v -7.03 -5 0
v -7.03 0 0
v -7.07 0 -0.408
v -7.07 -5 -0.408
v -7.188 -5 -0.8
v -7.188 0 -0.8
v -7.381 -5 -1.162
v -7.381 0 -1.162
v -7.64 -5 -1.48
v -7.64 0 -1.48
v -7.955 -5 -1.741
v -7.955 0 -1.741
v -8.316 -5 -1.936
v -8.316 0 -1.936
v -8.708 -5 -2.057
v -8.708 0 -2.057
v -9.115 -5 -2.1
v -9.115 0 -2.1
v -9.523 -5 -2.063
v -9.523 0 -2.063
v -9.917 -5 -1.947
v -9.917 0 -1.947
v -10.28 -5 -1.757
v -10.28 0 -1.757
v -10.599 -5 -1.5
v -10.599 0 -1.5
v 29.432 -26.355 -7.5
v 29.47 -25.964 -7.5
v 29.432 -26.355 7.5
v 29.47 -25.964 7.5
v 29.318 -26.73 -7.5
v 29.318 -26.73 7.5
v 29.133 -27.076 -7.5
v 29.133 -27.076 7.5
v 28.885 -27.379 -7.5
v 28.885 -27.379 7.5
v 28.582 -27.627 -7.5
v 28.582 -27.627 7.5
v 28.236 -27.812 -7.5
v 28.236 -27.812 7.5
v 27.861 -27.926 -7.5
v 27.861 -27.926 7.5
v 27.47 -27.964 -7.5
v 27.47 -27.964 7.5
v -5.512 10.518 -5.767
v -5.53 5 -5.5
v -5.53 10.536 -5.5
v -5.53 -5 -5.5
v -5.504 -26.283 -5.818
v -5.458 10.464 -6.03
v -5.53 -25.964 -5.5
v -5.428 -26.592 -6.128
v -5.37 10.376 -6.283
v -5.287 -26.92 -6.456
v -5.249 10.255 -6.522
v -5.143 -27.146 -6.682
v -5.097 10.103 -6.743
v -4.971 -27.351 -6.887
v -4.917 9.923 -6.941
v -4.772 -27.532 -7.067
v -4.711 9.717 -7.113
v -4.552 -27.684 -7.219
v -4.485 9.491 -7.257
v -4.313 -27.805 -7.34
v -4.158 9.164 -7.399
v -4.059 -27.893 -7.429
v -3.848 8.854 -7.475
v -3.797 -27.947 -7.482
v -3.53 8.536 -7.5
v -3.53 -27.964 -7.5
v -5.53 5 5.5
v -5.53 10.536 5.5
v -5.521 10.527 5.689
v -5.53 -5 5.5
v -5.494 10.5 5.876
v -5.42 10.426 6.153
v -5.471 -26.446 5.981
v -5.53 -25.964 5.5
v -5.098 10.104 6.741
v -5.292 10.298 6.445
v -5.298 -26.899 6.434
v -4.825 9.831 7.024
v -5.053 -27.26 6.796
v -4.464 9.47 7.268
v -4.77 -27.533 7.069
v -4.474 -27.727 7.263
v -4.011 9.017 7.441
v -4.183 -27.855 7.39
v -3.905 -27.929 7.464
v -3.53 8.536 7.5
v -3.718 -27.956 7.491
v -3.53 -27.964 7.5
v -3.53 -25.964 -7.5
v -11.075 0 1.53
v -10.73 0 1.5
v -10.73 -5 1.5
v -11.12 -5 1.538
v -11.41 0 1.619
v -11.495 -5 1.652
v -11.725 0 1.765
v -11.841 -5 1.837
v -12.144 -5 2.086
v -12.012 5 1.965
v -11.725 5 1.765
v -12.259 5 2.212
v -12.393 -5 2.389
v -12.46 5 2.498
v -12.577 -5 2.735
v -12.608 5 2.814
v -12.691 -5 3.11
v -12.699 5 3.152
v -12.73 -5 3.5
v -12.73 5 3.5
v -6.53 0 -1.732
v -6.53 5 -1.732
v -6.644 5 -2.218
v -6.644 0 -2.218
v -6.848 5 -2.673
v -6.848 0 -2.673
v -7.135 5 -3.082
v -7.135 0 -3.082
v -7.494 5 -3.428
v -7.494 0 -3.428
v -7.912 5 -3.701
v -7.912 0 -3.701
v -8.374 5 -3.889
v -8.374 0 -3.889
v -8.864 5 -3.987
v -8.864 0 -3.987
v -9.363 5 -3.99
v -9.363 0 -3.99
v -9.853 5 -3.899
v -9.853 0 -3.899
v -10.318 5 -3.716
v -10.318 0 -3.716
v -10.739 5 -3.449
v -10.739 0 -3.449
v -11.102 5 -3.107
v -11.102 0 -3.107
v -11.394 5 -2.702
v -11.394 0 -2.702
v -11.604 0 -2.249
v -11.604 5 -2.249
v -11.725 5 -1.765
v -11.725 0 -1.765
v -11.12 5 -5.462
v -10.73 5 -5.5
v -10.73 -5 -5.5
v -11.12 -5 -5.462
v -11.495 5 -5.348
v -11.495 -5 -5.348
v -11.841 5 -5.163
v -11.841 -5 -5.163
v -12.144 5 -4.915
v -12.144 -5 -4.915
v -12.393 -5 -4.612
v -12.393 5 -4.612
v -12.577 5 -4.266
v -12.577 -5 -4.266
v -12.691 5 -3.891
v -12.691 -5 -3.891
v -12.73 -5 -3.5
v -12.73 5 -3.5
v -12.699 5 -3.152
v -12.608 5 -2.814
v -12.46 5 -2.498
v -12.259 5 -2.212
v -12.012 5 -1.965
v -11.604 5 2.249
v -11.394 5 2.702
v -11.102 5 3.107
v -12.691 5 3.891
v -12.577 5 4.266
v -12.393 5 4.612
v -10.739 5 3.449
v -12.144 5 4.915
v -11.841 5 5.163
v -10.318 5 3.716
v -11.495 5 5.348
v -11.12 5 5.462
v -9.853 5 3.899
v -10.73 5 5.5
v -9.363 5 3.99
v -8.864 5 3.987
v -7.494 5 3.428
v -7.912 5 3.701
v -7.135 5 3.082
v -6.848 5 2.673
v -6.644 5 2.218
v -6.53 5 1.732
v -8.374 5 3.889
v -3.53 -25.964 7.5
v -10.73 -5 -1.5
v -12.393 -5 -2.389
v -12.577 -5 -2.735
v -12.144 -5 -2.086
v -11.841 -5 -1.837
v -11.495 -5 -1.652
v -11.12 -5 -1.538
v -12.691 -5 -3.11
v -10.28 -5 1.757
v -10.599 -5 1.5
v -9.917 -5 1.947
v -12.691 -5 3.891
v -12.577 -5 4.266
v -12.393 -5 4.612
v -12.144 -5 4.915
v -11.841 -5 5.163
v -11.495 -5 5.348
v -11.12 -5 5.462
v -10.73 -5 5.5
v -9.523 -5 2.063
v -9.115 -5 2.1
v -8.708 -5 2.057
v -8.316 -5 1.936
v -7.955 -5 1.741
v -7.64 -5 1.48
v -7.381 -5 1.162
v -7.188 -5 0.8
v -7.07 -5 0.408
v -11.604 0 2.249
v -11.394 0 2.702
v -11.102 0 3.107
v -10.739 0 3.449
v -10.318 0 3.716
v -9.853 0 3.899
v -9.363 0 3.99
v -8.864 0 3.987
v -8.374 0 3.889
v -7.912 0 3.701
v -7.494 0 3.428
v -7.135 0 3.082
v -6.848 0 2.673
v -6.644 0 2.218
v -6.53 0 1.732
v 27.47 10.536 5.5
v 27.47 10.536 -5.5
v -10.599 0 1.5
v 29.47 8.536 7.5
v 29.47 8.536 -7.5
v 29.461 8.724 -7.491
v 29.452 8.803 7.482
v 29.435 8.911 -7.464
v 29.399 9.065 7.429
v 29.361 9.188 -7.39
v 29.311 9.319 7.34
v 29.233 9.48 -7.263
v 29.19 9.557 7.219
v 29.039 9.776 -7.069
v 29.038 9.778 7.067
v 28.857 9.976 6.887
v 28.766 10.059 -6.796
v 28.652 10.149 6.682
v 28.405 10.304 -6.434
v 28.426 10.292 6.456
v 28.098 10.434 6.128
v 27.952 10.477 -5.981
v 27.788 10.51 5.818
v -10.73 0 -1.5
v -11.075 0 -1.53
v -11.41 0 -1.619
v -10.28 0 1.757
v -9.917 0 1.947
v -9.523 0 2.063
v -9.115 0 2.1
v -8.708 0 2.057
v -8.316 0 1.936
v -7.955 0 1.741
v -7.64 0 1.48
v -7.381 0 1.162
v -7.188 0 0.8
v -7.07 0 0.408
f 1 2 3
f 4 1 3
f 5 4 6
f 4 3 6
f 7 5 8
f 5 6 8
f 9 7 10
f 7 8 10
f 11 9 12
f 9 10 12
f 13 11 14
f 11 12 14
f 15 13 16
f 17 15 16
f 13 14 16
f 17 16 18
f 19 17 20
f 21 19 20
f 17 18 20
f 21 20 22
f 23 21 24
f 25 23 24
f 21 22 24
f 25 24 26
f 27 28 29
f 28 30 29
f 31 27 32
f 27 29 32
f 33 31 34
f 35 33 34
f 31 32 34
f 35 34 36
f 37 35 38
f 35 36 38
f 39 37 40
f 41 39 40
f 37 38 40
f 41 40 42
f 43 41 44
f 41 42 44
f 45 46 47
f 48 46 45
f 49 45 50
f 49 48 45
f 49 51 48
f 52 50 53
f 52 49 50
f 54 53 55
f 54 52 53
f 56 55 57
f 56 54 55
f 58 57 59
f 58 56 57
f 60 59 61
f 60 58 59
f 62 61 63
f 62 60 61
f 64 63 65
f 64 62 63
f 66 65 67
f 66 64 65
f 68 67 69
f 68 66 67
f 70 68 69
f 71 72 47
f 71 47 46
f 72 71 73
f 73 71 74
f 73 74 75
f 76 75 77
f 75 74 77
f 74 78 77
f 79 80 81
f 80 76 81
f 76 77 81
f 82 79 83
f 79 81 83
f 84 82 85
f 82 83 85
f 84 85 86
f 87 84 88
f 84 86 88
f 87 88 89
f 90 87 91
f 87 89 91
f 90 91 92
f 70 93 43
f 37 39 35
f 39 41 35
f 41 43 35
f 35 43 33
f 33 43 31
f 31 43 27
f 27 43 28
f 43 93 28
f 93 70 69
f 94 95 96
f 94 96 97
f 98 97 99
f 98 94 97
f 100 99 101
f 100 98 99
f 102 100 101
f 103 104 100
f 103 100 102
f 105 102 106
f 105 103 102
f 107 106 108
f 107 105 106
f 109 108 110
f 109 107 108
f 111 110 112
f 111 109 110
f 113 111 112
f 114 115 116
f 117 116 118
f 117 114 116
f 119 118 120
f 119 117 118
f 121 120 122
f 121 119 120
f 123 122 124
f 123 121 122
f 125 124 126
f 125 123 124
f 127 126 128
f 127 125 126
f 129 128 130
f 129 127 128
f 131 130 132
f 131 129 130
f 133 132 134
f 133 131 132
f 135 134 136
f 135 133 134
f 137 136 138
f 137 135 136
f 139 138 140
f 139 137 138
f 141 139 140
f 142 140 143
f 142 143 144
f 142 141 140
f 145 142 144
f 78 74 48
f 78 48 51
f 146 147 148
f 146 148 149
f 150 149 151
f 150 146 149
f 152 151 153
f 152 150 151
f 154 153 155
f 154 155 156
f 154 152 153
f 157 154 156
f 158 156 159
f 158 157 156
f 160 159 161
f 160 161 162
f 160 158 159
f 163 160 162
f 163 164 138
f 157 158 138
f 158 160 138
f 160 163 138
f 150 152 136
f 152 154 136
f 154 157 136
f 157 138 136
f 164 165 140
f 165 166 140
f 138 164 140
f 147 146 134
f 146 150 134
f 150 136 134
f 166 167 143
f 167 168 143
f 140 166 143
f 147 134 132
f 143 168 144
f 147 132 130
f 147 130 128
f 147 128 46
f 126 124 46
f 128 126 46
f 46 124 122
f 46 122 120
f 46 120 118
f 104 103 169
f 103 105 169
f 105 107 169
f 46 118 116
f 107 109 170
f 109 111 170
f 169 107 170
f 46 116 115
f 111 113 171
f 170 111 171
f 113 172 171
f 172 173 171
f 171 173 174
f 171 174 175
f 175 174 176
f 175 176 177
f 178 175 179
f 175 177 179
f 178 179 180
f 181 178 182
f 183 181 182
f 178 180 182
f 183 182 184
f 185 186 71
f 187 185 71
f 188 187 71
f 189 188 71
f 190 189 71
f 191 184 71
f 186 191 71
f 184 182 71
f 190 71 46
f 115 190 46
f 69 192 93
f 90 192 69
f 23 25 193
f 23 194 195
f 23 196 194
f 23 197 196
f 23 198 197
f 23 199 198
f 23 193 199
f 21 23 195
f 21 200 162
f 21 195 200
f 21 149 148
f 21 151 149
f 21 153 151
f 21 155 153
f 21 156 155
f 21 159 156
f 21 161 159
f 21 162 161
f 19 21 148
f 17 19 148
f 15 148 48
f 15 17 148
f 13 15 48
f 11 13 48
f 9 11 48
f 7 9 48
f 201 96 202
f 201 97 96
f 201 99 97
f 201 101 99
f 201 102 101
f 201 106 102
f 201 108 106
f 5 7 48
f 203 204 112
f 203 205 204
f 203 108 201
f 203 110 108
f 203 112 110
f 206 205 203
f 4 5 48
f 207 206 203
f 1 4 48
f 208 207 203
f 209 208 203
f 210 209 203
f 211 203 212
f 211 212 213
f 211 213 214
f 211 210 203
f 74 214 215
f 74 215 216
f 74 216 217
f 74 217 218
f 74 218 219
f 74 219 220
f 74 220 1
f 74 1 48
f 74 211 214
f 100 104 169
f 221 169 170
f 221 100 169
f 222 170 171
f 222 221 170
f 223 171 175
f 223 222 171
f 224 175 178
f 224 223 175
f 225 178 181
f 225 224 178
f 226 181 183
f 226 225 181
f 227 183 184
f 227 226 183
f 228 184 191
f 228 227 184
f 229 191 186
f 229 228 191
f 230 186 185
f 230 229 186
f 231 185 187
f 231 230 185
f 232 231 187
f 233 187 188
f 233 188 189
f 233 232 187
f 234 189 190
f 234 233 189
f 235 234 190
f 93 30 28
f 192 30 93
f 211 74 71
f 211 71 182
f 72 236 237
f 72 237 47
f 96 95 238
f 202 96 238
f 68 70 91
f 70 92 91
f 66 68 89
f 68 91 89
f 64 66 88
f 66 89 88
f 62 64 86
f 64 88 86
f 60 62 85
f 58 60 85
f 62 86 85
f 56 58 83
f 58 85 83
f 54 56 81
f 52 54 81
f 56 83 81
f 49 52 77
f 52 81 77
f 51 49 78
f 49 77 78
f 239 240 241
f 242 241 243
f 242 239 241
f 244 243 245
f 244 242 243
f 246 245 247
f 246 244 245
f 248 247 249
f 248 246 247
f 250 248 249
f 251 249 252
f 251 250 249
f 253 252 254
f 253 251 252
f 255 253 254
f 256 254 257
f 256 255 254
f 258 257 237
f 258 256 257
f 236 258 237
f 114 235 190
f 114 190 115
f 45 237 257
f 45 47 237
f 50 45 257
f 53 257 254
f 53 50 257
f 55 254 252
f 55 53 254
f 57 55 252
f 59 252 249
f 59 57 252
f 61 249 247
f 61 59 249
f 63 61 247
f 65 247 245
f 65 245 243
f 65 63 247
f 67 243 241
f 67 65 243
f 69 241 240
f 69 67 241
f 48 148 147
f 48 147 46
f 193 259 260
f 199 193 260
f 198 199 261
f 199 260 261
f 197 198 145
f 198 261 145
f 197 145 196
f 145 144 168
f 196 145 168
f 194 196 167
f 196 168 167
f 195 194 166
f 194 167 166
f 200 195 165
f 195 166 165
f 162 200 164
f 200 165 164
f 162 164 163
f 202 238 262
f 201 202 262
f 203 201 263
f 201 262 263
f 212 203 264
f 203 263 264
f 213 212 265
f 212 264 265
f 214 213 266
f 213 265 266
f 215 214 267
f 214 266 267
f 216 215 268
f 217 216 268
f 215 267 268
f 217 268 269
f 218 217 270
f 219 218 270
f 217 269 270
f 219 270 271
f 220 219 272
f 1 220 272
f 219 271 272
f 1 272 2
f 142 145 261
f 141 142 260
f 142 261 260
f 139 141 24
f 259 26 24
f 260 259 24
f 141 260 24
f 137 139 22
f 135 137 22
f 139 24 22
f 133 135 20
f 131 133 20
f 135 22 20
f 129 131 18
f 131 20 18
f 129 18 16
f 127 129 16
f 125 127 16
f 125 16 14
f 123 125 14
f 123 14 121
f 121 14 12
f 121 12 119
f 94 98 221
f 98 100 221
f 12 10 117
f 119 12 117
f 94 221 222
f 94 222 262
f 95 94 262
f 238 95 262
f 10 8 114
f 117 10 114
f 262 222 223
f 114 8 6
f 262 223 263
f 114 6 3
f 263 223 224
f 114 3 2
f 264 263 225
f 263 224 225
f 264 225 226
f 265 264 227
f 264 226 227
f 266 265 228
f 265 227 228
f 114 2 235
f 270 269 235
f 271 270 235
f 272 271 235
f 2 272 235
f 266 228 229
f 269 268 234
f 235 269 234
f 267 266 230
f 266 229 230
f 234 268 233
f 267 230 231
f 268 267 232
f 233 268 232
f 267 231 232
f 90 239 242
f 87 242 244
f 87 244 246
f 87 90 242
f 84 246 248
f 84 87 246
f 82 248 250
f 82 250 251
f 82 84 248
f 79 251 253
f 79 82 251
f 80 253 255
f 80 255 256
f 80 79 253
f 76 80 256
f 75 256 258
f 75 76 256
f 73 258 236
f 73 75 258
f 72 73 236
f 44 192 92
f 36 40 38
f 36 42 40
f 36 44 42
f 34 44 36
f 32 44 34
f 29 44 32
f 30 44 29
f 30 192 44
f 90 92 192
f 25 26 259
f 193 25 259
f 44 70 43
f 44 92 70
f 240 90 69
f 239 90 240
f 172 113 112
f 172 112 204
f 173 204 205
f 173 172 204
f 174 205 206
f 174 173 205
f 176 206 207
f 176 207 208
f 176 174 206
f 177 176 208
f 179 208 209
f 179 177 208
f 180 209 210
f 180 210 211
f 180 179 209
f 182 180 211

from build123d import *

# Parameters (mm, degrees)
F1_DEPTH    = 7.5
F2_R        = 1.99999
F4_DEPTH    = 5
F5_DEPTH    = 5
F6_T1_DEPTH = 20


# Not quite as in the source:
# - a fillet or chamfer that OpenCascade refuses, or shapes differently, is made with other operations: its cross-section is extruded or revolved along the edge and cut away or added
# - a fillet or chamfer is up to 0.001 mm smaller than in the source, because OpenCascade refuses the exact size


with BuildPart() as f1:
    # F0 (on Top) → F1 (new body, symmetric)
    with BuildSketch(Plane.XY):
        Polygon((29.4704200836, 8.5355388032), (29.4704200836, 10.5355388032), (-5.5295799164, 10.5355388032), (-5.5295799164, -27.9644611968), (29.4704200836, -27.9644611968), (29.4704200836, -25.9644611968), (27.4704200836, -25.9644611968), (-3.5295799164, -25.9644611968), (-3.5295799164, 8.5355388032), (27.4704200836, 8.5355388032), align=None)
    extrude(amount=F1_DEPTH, both=True)

    # F2 (radius 2 in the source; OpenCascade refuses exactly that, so slightly less here)
    f2_edges = [f1.edges().sort_by_distance(p)[0] for p in [
        (11.97042, 10.535539, 7.5),
        (11.97042, 10.535539, -7.5),
        (-5.52958, -8.714461, 7.5),
        (29.47042, -27.964461, 0),
        (-5.52958, -27.964461, 0),
        (29.47042, 10.535539, 0),
        (-5.52958, -8.714461, -7.5),
    ]]
    fillet(f2_edges, radius=F2_R)

    # F3 (on Front) → F4 (join, symmetric)
    with BuildSketch(Plane.XZ):
        with BuildLine():
            ThreePointArc((-11.7295799164, 1.7323087668), (-9.1295799164, 4.000441756), (-6.5295799164, 1.7323087668))
            Line((-6.5295799164, 1.7323087668), (-6.5295799164, -1.7323087668))
            ThreePointArc((-6.5295799164, -1.7323087668), (-9.1295799164, -4.000441756), (-11.7295799164, -1.7323087668))
            Line((-11.7295799164, -1.7323087668), (-11.7295799164, -1.5))
            Line((-11.7295799164, -1.5), (-12.7295799164, -1.5))
            Line((-12.7295799164, -1.5), (-12.7295799164, -5.500441756))
            Line((-12.7295799164, -5.500441756), (-5.5295799164, -5.500441756))
            Line((-5.5295799164, -5.500441756), (-5.5295799164, 5.500441756))
            Line((-5.5295799164, 5.500441756), (-12.7295799164, 5.500441756))
            Line((-12.7295799164, 5.500441756), (-12.7295799164, 1.5))
            Line((-12.7295799164, 1.5), (-11.7295799164, 1.5))
            Line((-11.7295799164, 1.5), (-11.7295799164, 1.7323087668))
        make_face()
    extrude(amount=F4_DEPTH, both=True)

    # F3 (on Front) → F5 (join)
    with BuildSketch(Plane.XZ):
        with BuildLine():
            Line((-6.5295799164, -1.7323087668), (-6.5295799164, 1.7323087668))
            ThreePointArc((-6.5295799164, 1.7323087668), (-9.1295799164, 4.000441756), (-11.7295799164, 1.7323087668))
            Line((-11.7295799164, 1.7323087668), (-11.7295799164, 1.5))
            Line((-11.7295799164, 1.5), (-10.5992737621, 1.5))
            ThreePointArc((-10.5992737621, 1.5), (-8.3160558159, 1.9360213165), (-7.0295799164, 0))
            ThreePointArc((-7.0295799164, 0), (-8.3160558159, -1.9360213165), (-10.5992737621, -1.5))
            Line((-10.5992737621, -1.5), (-11.7295799164, -1.5))
            Line((-11.7295799164, -1.5), (-11.7295799164, -1.7323087668))
            ThreePointArc((-11.7295799164, -1.7323087668), (-9.1295799164, -4.000441756), (-6.5295799164, -1.7323087668))
        make_face()
    extrude(amount=F5_DEPTH)

    # F6: fillet of radius 2 on 4 edges, made by hand

    # F6_s2 → F6_t1 (cut)
    with BuildSketch(Plane.XZ.offset(-10)):
        with BuildLine():
            ThreePointArc((-12.7295799164, 3.500441756), (-12.1437934788, 4.9146553183), (-10.7295799164, 5.500441756))
            Line((-10.7295799164, 5.500441756), (-12.7295799164, 5.500441756))
            Line((-12.7295799164, 5.500441756), (-12.7295799164, 3.500441756))
        make_face()
        with BuildLine():
            ThreePointArc((-10.7295799164, -5.500441756), (-12.1437934788, -4.9146553183), (-12.7295799164, -3.500441756))
            Line((-12.7295799164, -3.500441756), (-12.7295799164, -5.500441756))
            Line((-12.7295799164, -5.500441756), (-10.7295799164, -5.500441756))
        make_face()
        with BuildLine():
            ThreePointArc((-10.7295799164, 1.5), (-12.1437934788, 2.0857864376), (-12.7295799164, 3.5))
            Line((-12.7295799164, 3.5), (-12.7295799164, 1.5))
            Line((-12.7295799164, 1.5), (-10.7295799164, 1.5))
        make_face()
        with BuildLine():
            ThreePointArc((-10.7295799164, -1.5), (-12.1437934788, -2.0857864376), (-12.7295799164, -3.5))
            Line((-12.7295799164, -3.5), (-12.7295799164, -1.5))
            Line((-12.7295799164, -1.5), (-10.7295799164, -1.5))
        make_face()
    extrude(amount=F6_T1_DEPTH, mode=Mode.SUBTRACT)


solid = f1.part
